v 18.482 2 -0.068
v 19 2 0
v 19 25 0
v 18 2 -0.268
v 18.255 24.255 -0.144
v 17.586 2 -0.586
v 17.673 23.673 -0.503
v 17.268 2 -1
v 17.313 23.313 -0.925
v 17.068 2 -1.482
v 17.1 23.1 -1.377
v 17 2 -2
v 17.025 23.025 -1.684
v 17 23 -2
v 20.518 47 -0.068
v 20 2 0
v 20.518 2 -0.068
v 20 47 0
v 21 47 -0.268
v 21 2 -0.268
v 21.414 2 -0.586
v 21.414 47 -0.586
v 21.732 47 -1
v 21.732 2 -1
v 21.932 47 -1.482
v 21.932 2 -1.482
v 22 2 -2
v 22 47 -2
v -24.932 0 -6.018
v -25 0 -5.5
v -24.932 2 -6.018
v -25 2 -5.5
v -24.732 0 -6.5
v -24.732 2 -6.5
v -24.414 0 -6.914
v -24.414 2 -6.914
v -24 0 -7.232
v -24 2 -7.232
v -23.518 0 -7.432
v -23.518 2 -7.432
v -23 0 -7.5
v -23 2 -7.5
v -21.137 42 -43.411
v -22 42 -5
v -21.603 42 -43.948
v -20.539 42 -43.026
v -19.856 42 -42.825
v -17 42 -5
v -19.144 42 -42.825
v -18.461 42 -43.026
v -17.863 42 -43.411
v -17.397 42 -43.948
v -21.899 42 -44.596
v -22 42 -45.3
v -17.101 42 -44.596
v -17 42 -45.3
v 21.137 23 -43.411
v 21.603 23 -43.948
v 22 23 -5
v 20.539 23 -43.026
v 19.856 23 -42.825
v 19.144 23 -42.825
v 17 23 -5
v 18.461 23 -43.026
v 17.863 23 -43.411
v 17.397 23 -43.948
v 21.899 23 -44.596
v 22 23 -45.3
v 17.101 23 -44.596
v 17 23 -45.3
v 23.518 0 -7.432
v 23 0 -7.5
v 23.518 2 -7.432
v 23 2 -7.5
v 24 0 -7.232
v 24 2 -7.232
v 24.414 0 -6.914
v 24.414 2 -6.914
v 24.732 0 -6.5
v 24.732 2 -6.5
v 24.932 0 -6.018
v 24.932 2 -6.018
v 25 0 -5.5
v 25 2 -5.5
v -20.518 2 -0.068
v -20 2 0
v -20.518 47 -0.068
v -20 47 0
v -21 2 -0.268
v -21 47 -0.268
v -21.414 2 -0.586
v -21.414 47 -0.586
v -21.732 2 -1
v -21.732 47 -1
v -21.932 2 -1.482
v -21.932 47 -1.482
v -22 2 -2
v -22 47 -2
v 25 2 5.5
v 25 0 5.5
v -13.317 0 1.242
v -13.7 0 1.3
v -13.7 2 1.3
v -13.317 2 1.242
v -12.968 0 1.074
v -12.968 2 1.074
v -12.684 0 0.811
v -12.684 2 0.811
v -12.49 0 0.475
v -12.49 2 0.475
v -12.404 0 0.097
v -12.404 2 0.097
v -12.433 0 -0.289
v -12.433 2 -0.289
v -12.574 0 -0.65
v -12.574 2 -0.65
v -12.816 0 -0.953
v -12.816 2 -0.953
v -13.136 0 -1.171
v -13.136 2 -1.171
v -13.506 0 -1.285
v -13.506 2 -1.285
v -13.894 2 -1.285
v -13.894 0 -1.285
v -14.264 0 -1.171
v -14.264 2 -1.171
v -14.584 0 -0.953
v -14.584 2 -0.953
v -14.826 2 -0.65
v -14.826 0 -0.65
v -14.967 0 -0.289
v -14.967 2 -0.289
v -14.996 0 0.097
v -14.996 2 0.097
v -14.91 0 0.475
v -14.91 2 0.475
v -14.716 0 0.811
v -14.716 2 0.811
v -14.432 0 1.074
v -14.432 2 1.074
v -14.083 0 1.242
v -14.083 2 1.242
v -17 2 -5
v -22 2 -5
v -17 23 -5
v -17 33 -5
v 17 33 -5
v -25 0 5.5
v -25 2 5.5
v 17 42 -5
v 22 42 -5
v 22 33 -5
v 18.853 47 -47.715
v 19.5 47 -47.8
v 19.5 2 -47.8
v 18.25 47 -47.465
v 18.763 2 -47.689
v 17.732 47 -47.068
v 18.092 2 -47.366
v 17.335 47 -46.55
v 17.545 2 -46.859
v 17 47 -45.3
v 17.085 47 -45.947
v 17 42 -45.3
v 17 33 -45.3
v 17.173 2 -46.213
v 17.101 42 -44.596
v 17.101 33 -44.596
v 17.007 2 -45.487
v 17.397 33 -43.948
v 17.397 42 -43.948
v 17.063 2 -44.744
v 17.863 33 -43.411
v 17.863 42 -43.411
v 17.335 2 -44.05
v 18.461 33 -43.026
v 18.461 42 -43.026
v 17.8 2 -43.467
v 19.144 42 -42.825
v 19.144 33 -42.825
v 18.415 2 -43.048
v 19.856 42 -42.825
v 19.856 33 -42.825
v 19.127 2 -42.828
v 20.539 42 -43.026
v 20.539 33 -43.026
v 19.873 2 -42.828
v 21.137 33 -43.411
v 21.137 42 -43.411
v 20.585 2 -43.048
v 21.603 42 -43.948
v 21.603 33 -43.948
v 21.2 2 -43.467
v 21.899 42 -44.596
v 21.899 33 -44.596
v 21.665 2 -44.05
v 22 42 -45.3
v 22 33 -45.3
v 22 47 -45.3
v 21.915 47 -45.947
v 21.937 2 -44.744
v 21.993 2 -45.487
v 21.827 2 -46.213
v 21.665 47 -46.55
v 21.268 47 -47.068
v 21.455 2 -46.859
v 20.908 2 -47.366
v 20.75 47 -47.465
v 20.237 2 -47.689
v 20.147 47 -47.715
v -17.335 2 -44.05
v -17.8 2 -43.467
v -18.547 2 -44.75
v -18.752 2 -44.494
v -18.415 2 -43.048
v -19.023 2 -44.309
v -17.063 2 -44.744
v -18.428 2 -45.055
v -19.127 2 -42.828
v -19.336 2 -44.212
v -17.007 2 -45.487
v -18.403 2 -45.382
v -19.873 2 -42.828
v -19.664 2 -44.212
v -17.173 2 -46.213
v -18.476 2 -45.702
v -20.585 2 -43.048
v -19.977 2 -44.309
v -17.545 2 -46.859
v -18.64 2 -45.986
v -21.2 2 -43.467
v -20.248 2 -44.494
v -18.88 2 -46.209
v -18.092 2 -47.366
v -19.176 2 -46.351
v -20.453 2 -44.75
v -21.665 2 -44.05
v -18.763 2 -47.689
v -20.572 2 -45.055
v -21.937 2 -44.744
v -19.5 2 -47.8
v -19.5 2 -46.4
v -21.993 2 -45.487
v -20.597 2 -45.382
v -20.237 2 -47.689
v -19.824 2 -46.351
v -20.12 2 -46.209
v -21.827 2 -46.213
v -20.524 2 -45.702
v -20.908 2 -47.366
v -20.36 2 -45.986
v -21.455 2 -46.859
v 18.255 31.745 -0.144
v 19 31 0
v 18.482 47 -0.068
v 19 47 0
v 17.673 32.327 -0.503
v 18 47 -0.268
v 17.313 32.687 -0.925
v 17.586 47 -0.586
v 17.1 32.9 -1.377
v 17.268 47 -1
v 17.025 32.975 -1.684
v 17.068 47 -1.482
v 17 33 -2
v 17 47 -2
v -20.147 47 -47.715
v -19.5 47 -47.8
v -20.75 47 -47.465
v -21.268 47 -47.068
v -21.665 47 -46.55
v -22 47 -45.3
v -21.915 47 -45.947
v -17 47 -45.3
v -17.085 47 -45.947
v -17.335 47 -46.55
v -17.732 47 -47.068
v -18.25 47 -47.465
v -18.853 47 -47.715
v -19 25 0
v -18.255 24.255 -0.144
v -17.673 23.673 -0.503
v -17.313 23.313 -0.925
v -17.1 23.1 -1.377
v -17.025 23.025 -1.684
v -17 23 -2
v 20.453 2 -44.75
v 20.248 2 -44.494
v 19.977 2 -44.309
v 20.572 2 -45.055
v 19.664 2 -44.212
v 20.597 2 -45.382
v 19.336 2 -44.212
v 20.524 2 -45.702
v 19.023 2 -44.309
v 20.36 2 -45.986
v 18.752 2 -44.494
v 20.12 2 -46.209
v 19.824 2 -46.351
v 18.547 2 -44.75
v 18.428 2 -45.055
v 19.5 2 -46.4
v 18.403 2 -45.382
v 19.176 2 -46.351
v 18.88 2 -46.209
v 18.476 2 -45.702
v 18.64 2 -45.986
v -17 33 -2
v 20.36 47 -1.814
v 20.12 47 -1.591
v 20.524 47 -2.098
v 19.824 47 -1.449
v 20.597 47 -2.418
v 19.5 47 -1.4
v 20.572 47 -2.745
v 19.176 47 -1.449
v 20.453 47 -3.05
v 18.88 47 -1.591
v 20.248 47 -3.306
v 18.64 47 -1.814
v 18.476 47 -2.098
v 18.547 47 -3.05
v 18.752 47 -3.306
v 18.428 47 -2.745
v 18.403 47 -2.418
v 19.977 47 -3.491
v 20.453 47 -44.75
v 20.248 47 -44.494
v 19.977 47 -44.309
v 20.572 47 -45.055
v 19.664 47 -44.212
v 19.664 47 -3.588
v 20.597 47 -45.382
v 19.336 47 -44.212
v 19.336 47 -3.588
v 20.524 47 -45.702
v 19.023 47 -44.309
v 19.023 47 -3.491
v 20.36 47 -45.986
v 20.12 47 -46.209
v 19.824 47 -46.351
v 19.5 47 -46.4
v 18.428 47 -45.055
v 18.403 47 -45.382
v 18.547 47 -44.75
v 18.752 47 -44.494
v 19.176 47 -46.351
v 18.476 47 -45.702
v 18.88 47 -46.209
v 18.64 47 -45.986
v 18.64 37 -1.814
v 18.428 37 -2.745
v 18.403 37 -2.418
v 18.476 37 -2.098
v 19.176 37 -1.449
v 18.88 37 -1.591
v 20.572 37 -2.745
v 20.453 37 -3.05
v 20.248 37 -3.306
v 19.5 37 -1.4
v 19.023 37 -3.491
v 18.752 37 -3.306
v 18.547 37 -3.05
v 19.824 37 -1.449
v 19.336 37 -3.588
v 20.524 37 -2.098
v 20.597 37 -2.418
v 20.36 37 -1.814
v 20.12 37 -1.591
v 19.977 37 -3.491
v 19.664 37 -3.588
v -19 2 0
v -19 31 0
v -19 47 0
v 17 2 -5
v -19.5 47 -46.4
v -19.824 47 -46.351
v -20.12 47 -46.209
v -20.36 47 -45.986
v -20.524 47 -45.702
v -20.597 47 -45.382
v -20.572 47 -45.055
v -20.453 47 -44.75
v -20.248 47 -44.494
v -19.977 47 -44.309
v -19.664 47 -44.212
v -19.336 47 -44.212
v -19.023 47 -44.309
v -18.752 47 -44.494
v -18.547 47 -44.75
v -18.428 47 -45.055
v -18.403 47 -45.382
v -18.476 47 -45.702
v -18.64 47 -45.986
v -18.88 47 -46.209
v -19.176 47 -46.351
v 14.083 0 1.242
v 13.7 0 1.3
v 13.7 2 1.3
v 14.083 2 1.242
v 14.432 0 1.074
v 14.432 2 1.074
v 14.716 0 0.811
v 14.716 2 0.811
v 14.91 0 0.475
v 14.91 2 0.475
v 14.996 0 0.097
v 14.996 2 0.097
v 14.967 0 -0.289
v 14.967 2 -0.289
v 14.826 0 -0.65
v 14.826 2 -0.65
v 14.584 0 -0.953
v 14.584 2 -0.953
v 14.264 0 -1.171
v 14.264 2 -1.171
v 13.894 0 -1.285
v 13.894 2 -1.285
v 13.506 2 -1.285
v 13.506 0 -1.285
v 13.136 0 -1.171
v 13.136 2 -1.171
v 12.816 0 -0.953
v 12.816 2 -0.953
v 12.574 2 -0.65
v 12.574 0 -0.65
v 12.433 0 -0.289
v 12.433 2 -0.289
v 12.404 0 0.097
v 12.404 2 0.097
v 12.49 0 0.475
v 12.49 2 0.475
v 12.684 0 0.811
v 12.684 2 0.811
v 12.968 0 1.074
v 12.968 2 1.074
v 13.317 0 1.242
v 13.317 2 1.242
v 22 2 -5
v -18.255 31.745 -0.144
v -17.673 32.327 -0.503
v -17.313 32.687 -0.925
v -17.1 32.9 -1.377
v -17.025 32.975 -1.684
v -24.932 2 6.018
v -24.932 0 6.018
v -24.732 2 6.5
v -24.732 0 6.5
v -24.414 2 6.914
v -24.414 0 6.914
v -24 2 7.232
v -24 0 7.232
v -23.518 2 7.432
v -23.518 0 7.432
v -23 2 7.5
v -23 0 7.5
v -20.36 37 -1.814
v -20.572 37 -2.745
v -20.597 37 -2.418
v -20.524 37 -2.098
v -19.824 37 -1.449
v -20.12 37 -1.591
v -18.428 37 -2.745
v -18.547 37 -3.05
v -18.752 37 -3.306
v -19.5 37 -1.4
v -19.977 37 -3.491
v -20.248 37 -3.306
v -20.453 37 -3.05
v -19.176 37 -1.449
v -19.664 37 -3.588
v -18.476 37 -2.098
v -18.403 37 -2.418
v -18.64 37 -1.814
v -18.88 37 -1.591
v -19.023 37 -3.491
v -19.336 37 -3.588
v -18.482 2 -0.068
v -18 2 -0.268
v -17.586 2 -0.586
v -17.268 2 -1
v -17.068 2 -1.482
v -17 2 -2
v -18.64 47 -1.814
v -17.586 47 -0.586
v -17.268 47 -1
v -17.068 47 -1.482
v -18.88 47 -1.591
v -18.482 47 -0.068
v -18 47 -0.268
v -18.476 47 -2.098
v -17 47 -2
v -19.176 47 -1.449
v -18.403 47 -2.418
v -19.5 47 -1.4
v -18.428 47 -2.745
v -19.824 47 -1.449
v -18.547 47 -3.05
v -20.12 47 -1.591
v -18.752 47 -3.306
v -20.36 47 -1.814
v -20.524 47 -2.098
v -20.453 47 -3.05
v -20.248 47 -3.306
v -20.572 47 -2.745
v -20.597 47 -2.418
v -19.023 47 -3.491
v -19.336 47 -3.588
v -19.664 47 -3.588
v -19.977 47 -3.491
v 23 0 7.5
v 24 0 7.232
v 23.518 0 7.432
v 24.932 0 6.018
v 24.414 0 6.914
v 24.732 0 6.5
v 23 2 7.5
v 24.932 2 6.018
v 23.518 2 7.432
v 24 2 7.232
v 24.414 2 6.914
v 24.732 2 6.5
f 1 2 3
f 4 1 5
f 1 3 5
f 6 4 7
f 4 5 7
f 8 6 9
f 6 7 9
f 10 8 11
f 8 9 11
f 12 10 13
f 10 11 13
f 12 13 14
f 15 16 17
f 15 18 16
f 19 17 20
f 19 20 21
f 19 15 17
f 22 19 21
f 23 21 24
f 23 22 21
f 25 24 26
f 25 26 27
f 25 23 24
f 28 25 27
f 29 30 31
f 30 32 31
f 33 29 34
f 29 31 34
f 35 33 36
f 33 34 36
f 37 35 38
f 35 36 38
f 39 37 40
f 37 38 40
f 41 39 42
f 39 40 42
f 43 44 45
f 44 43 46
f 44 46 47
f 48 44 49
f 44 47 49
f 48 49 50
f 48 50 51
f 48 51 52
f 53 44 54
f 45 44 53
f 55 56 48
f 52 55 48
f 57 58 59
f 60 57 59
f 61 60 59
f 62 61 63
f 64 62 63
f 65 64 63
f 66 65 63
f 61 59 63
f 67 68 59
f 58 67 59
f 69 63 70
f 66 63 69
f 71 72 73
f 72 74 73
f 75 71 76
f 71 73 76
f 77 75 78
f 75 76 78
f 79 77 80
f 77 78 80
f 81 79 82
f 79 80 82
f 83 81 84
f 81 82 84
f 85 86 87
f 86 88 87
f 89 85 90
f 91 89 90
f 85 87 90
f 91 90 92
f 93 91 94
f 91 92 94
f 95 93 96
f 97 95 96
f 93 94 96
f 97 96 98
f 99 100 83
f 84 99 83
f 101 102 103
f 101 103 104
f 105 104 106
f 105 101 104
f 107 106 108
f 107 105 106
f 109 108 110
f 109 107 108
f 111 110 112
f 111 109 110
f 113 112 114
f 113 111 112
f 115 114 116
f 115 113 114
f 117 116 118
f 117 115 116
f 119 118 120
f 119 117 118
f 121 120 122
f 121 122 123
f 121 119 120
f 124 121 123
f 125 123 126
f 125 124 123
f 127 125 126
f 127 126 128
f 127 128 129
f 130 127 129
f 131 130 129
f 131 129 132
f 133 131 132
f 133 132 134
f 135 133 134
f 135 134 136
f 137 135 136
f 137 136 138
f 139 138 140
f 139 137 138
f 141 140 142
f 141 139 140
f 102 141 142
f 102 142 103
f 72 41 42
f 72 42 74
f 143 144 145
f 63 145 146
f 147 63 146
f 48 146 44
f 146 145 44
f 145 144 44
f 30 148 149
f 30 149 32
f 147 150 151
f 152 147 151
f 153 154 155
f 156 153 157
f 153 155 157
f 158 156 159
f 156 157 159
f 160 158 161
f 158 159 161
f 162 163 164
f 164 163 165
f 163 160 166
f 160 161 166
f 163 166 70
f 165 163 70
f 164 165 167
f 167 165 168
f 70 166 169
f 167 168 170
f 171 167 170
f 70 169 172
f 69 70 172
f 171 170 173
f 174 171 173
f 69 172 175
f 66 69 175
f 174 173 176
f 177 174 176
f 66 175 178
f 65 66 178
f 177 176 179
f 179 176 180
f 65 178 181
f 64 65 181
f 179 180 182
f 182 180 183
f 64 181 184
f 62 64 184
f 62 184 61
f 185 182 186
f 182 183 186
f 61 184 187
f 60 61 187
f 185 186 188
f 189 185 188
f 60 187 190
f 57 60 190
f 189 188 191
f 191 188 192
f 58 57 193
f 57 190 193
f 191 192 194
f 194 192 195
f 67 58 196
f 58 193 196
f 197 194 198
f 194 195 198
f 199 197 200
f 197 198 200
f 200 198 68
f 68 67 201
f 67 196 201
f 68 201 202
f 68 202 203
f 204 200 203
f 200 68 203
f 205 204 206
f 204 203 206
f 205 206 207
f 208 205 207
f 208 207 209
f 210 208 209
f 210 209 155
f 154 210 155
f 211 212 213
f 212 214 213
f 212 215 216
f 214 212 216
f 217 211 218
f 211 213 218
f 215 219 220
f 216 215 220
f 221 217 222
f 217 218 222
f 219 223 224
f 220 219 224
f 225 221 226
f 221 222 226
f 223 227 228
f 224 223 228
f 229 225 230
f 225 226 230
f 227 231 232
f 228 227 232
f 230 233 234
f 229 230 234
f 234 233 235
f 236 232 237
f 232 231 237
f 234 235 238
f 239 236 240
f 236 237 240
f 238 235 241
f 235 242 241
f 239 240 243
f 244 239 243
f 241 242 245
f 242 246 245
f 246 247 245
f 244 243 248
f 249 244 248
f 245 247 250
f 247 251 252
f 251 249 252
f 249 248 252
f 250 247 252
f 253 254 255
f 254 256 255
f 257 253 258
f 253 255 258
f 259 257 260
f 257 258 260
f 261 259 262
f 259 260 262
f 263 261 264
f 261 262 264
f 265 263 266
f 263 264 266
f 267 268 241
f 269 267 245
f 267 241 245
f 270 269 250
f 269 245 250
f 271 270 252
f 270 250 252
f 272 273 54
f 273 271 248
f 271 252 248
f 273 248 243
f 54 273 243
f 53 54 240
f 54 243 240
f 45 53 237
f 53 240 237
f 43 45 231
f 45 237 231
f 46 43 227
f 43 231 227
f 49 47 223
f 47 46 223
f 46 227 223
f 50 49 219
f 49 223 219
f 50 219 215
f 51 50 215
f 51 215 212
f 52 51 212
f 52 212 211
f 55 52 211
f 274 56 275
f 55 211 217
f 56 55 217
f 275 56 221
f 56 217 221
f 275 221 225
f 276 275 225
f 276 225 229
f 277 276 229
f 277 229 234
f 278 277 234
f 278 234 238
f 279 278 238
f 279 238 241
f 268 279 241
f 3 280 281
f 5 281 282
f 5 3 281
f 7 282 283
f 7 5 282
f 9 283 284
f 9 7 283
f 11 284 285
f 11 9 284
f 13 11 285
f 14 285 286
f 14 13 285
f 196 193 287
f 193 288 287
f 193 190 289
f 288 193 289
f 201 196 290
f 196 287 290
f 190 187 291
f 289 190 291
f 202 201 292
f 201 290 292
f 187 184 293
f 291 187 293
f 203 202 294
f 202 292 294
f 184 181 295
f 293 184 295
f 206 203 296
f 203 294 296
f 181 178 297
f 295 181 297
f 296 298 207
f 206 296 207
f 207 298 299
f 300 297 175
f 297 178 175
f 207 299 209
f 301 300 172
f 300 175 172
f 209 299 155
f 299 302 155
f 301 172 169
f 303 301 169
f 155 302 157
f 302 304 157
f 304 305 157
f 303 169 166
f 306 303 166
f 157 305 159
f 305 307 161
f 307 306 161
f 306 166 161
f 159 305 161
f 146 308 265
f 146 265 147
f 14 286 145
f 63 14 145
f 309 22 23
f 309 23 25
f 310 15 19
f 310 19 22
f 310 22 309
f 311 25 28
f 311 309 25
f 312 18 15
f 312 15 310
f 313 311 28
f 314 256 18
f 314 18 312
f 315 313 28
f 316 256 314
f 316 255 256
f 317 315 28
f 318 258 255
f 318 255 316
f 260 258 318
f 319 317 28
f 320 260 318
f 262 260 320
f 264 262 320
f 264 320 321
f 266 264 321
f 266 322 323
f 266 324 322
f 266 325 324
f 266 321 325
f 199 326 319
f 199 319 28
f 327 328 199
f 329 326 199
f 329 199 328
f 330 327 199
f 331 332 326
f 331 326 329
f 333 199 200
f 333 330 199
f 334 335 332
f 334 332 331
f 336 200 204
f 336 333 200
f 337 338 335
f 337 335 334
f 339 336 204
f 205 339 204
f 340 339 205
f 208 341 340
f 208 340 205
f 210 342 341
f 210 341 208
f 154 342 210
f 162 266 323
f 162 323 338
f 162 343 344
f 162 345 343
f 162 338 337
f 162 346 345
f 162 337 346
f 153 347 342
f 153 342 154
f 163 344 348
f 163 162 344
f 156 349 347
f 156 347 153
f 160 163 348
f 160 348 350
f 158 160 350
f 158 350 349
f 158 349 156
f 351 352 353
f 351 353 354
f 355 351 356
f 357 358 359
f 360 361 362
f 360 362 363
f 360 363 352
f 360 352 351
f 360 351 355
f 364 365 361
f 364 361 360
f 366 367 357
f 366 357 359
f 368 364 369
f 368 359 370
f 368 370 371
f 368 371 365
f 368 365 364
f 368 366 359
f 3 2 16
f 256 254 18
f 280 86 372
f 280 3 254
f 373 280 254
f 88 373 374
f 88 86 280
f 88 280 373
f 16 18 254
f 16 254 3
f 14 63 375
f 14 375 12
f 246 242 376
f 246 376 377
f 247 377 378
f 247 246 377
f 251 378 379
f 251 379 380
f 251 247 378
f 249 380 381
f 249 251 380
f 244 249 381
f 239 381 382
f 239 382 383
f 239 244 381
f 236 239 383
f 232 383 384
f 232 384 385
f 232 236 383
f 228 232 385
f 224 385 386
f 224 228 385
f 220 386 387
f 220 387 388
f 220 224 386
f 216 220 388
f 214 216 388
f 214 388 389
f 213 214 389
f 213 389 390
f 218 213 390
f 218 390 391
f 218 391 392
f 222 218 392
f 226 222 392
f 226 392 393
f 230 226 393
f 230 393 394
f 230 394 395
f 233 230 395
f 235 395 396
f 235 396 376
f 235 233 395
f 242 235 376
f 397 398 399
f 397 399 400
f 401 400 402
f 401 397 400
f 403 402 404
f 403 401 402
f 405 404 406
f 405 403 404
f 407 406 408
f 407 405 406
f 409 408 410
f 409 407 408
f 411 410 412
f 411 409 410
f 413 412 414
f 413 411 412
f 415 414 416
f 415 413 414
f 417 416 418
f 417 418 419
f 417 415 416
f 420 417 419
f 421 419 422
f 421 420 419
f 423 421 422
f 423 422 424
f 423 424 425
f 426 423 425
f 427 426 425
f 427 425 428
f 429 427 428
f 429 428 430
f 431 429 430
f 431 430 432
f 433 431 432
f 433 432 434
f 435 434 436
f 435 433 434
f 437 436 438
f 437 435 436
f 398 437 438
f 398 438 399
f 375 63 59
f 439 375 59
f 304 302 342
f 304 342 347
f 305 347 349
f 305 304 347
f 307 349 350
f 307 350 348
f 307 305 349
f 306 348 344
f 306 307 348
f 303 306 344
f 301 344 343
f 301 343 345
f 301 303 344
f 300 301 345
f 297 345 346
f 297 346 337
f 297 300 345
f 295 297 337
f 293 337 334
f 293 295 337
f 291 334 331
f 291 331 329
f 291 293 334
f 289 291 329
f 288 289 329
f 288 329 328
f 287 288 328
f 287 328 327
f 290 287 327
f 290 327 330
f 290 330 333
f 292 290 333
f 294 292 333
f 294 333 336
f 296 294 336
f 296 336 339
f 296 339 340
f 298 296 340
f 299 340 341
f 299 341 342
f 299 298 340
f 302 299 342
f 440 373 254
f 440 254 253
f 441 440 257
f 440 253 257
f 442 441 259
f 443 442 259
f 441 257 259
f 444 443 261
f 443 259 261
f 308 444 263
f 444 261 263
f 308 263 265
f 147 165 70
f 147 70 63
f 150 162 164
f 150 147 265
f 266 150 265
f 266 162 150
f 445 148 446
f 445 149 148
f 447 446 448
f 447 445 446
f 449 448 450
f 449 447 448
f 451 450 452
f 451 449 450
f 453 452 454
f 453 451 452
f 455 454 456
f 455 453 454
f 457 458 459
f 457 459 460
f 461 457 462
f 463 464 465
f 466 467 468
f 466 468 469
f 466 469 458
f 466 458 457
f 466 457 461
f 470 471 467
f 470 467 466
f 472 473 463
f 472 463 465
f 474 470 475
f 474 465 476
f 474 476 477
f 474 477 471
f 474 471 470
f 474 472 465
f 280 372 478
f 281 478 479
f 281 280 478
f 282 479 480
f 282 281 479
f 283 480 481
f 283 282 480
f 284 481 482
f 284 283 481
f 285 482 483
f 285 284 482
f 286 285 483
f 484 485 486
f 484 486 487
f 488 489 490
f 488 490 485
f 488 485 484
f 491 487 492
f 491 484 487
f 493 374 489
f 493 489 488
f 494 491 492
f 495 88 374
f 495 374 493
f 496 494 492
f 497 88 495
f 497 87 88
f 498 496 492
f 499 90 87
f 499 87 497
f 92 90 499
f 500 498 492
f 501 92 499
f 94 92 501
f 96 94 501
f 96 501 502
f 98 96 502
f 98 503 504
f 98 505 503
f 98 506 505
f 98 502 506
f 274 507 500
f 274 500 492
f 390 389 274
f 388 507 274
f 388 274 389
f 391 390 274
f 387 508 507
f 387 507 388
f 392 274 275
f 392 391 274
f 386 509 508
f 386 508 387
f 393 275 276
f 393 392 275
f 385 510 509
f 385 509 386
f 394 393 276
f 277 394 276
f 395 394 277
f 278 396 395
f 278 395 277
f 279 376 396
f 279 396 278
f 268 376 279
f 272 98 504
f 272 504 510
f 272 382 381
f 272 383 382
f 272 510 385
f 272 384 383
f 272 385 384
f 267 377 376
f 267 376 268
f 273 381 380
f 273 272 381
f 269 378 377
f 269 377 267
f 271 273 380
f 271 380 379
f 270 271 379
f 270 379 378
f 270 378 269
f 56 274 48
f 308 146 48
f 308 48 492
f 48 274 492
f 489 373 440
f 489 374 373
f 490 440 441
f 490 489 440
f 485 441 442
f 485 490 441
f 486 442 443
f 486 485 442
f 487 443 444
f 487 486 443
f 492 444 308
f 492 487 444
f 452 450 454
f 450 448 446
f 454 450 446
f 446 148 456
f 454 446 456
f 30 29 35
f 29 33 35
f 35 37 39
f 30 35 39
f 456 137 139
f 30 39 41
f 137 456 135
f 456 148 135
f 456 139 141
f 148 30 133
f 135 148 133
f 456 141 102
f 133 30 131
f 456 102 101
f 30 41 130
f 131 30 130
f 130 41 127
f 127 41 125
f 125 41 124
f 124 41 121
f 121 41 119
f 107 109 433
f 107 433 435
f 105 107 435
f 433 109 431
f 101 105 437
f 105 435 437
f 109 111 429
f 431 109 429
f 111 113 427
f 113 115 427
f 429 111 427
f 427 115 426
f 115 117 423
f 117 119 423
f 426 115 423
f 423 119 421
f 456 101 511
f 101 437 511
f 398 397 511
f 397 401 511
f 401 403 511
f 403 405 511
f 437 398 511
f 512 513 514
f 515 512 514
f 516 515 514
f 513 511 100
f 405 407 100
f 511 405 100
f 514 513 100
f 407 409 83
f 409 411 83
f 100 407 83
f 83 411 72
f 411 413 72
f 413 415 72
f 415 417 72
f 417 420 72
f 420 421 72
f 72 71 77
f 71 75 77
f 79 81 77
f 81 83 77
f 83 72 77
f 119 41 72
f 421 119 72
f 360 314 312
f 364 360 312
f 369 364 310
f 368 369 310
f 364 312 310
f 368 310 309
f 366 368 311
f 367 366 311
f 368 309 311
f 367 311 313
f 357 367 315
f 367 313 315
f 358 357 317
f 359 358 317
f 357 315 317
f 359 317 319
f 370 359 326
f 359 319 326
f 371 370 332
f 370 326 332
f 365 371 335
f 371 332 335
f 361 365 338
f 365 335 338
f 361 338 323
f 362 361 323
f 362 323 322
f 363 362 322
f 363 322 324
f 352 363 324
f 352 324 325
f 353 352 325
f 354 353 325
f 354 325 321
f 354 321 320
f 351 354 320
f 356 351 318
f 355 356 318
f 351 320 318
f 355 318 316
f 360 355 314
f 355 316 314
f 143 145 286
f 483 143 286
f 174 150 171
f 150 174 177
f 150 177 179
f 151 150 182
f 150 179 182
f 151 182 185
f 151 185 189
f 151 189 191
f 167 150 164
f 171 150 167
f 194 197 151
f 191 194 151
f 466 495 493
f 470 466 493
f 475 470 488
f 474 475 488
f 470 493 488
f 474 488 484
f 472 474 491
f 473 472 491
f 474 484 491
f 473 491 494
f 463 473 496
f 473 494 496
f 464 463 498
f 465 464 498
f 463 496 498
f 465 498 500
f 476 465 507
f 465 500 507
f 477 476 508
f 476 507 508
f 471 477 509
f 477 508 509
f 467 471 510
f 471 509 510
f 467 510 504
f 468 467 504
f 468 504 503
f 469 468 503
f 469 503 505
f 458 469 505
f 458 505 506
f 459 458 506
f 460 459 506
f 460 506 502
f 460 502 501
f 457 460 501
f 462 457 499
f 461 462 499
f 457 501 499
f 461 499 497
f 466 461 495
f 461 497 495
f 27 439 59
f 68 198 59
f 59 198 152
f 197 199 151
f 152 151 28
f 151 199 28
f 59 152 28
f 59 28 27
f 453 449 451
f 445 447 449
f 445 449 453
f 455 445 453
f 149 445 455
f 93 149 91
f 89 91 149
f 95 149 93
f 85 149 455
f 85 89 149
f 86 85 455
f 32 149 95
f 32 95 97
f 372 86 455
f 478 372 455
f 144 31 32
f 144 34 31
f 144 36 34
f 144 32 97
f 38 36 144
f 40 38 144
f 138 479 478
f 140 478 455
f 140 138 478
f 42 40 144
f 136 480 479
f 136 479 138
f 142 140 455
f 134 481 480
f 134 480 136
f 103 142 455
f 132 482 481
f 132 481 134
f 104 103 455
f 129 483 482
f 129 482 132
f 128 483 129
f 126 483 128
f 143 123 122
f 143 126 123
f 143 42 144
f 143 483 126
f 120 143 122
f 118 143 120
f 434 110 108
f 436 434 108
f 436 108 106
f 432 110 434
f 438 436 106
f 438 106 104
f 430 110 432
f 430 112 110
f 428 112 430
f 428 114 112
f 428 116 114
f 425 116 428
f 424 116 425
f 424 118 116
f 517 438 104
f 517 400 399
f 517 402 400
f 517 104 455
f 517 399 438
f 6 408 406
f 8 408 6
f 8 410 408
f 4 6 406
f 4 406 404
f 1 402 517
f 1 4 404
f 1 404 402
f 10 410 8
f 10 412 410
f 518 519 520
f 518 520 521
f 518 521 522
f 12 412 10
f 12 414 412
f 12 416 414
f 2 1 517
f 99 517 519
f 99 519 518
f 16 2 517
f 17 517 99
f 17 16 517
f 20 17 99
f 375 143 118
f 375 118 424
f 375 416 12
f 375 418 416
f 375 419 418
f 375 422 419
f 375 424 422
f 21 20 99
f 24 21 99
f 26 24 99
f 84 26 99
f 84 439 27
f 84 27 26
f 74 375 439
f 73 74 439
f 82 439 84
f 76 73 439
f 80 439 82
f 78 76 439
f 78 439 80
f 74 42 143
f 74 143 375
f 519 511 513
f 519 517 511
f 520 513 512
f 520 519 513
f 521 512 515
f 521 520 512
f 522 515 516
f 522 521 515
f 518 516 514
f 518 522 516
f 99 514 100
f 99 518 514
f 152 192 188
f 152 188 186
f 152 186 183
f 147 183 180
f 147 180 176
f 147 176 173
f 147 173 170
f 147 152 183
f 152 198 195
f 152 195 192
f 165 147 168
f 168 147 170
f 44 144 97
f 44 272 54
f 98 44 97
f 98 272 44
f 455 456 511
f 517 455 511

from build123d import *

# Parameters (mm, degrees)
SKETCH_1_W           = 50
SKETCH_1_H           = 15
SKETCH_1_R           = 1.3
EXTRUDE_1_DEPTH      = 2
SKETCH_2_R           = 2.5
SKETCH_2_R_2         = 1.1
EXTRUDE_2_DEPTH      = 45
EXTRUDE_2_2_DEPTH    = 45
EXTRUDE_START        = 42
EXTRUDE_3_DEPTH      = 5
SKETCH_4_W           = 5
SKETCH_4_H           = 5
EXTRUDE_4_DEPTH      = 40
SKETCH_5_R           = 1.1
CUT_EXTRUDE_1_DEPTH  = 10
EXTRUDE_5_REACH      = 70.307
EXTRUDE_5_END_RADIUS = 2.5
SKETCH_7_W           = 5
SKETCH_7_H           = 10
FILLET_1_R           = 2
EXTRUDE_6_REACH      = 81.107
SKETCH_8_W           = 5
SKETCH_8_H           = 10
FILLET_3_R           = 2


# Read off the part's stored shape, not the designer's step: 凸台-拉伸3
with BuildPart() as part:
    # 草图1 → 凸台-拉伸1 (new body)
    with BuildSketch(Plane(origin=(0, 0, 0), x_dir=(1, 0, 0), z_dir=(0, 1, 0))):
        Rectangle(SKETCH_1_W, SKETCH_1_H)
        with Locations(Location((-13.7, 0, 0), (0, 0, 270))):
            Circle(SKETCH_1_R, mode=Mode.SUBTRACT)
        with Locations(Location((13.7, 0, 0), (0, 0, 270))):
            Circle(SKETCH_1_R, mode=Mode.SUBTRACT)
    extrude(amount=EXTRUDE_1_DEPTH)



with BuildPart() as body_2:
    # 草图2 → 凸台-拉伸2 (new body)
    with BuildSketch(Plane(origin=(0, 2, 0), x_dir=(1, 0, 0), z_dir=(0, 1, 0))):
        with Locations(Location((19.5, 45.3, 0), (0, 0, 90))):
            Circle(SKETCH_2_R)
        with Locations(Location((19.5, 45.3, 0), (0, 0, 90))):
            Circle(SKETCH_2_R_2, mode=Mode.SUBTRACT)
    extrude(amount=EXTRUDE_2_DEPTH)



with BuildPart() as body_3:
    # 草图2 → Extrude 2 2 (new body)
    with BuildSketch(Plane(origin=(0, 2, 0), x_dir=(1, 0, 0), z_dir=(0, 1, 0))):
        with Locations(Location((-19.5, 45.3, 0), (0, 0, 90))):
            Circle(SKETCH_2_R)
        with Locations(Location((-19.5, 45.3, 0), (0, 0, 90))):
            Circle(SKETCH_2_R_2, mode=Mode.SUBTRACT)
    extrude(amount=EXTRUDE_2_2_DEPTH)


with BuildPart() as body_2_1:
    add(body_2.part)

    add(body_3.part)  # 凸台-拉伸3 merges body 3
    # 凸台-拉伸3 outline → 凸台-拉伸3 (add)
    with BuildSketch(Plane(origin=(0, 0, 0), x_dir=(1, 0, 0), z_dir=(0, 1, 0)).offset(EXTRUDE_START)):
        with BuildLine():
            Line((-22, 0), (-17, 0))
            Line((-17, 0), (-17, 45.3))
            ThreePointArc((-17, 45.3), (-19.5, 42.8), (-22, 45.3))
            Line((-22, 45.3), (-22, 0))
        make_face()
        with BuildLine():
            Line((17, 45.3), (17, 0))
            Line((17, 0), (22, 0))
            Line((22, 0), (22, 45.3))
            ThreePointArc((22, 45.3), (19.5, 42.8), (17, 45.3))
        make_face()
    extrude(amount=EXTRUDE_3_DEPTH)


with BuildPart() as part_1:
    add(part.part)

    add(body_2_1.part)  # 凸台-拉伸4 merges body 2
    # 草图4 → 凸台-拉伸4 (add)
    with BuildSketch(Plane.XZ.offset(-42)):
        with Locations((19.5, -2.5)):
            Rectangle(SKETCH_4_W, SKETCH_4_H)
        with Locations((-19.5, -2.5)):
            Rectangle(SKETCH_4_W, SKETCH_4_H)
    extrude(amount=EXTRUDE_4_DEPTH)

    # 草图5 → 切除-拉伸1 (cut)
    with BuildSketch(Plane(origin=(0, 47, 0), x_dir=(1, 0, 0), z_dir=(0, 1, 0))):
        with Locations(Location((-19.5, 2.5, 0), (0, 0, 270))):
            Circle(SKETCH_5_R)
        with Locations(Location((19.5, 2.5, 0), (0, 0, 270))):
            Circle(SKETCH_5_R)
    extrude(amount=-CUT_EXTRUDE_1_DEPTH, mode=Mode.SUBTRACT)

    # 凸台-拉伸5: up to this cylinder (the profile starts outside it)
    extrude_5_end = Plane(origin=(19.5, 28, -45.3), z_dir=(0, -1, 0)) * Cylinder(EXTRUDE_5_END_RADIUS, 146.614, mode=Mode.PRIVATE)
    # 草图7 → 凸台-拉伸5 (add, up to the surface)
    with BuildSketch(Plane(origin=(0, 0, -5), x_dir=(-1, 0, 0), z_dir=(0, 0, -1)), mode=Mode.PRIVATE) as extrude_5_sk1:
        with Locations((-19.5, 28)):
            Rectangle(SKETCH_7_W, SKETCH_7_H)
    extrude_5_tool1 = extrude(extrude_5_sk1.sketch, amount=EXTRUDE_5_REACH, mode=Mode.PRIVATE) - extrude_5_end
    add(extrude_5_tool1.solids().sort_by_distance((19.5, 28, -5))[0])

    # 圆角1
    fillet_1_edges = [part_1.edges().sort_by_distance(p)[0] for p in [
        (25, 1, 7.5),
        (-25, 1, 7.5),
        (-25, 1, -7.5),
        (25, 1, -7.5),
    ]]
    fillet(fillet_1_edges, radius=FILLET_1_R)

    # 草图8 → 凸台-拉伸6 (add, up to next)
    with BuildSketch(Plane(origin=(-17, 0, 0), x_dir=(0, 0, -1), z_dir=(1, 0, 0)), mode=Mode.PRIVATE) as extrude_6_sk1:
        with Locations((2.5, 28)):
            Rectangle(SKETCH_8_W, SKETCH_8_H)
    extrude_6_tool1 = extrude(extrude_6_sk1.sketch, amount=EXTRUDE_6_REACH, mode=Mode.PRIVATE) - part_1.part
    add(extrude_6_tool1.solids().sort_by_distance((-17, 28, -2.5))[0])

    # 圆角3
    fillet_3_edges = [part_1.edges().sort_by_distance(p)[0] for p in [
        (-17, 40, 0),
        (17, 40, 0),
        (0, 23, 0),
        (0, 33, 0),
        (17, 12.5, 0),
        (22, 24.5, 0),
        (-22, 24.5, 0),
        (-17, 12.5, 0),
    ]]
    fillet(fillet_3_edges, radius=FILLET_3_R)


solid = part_1.part
